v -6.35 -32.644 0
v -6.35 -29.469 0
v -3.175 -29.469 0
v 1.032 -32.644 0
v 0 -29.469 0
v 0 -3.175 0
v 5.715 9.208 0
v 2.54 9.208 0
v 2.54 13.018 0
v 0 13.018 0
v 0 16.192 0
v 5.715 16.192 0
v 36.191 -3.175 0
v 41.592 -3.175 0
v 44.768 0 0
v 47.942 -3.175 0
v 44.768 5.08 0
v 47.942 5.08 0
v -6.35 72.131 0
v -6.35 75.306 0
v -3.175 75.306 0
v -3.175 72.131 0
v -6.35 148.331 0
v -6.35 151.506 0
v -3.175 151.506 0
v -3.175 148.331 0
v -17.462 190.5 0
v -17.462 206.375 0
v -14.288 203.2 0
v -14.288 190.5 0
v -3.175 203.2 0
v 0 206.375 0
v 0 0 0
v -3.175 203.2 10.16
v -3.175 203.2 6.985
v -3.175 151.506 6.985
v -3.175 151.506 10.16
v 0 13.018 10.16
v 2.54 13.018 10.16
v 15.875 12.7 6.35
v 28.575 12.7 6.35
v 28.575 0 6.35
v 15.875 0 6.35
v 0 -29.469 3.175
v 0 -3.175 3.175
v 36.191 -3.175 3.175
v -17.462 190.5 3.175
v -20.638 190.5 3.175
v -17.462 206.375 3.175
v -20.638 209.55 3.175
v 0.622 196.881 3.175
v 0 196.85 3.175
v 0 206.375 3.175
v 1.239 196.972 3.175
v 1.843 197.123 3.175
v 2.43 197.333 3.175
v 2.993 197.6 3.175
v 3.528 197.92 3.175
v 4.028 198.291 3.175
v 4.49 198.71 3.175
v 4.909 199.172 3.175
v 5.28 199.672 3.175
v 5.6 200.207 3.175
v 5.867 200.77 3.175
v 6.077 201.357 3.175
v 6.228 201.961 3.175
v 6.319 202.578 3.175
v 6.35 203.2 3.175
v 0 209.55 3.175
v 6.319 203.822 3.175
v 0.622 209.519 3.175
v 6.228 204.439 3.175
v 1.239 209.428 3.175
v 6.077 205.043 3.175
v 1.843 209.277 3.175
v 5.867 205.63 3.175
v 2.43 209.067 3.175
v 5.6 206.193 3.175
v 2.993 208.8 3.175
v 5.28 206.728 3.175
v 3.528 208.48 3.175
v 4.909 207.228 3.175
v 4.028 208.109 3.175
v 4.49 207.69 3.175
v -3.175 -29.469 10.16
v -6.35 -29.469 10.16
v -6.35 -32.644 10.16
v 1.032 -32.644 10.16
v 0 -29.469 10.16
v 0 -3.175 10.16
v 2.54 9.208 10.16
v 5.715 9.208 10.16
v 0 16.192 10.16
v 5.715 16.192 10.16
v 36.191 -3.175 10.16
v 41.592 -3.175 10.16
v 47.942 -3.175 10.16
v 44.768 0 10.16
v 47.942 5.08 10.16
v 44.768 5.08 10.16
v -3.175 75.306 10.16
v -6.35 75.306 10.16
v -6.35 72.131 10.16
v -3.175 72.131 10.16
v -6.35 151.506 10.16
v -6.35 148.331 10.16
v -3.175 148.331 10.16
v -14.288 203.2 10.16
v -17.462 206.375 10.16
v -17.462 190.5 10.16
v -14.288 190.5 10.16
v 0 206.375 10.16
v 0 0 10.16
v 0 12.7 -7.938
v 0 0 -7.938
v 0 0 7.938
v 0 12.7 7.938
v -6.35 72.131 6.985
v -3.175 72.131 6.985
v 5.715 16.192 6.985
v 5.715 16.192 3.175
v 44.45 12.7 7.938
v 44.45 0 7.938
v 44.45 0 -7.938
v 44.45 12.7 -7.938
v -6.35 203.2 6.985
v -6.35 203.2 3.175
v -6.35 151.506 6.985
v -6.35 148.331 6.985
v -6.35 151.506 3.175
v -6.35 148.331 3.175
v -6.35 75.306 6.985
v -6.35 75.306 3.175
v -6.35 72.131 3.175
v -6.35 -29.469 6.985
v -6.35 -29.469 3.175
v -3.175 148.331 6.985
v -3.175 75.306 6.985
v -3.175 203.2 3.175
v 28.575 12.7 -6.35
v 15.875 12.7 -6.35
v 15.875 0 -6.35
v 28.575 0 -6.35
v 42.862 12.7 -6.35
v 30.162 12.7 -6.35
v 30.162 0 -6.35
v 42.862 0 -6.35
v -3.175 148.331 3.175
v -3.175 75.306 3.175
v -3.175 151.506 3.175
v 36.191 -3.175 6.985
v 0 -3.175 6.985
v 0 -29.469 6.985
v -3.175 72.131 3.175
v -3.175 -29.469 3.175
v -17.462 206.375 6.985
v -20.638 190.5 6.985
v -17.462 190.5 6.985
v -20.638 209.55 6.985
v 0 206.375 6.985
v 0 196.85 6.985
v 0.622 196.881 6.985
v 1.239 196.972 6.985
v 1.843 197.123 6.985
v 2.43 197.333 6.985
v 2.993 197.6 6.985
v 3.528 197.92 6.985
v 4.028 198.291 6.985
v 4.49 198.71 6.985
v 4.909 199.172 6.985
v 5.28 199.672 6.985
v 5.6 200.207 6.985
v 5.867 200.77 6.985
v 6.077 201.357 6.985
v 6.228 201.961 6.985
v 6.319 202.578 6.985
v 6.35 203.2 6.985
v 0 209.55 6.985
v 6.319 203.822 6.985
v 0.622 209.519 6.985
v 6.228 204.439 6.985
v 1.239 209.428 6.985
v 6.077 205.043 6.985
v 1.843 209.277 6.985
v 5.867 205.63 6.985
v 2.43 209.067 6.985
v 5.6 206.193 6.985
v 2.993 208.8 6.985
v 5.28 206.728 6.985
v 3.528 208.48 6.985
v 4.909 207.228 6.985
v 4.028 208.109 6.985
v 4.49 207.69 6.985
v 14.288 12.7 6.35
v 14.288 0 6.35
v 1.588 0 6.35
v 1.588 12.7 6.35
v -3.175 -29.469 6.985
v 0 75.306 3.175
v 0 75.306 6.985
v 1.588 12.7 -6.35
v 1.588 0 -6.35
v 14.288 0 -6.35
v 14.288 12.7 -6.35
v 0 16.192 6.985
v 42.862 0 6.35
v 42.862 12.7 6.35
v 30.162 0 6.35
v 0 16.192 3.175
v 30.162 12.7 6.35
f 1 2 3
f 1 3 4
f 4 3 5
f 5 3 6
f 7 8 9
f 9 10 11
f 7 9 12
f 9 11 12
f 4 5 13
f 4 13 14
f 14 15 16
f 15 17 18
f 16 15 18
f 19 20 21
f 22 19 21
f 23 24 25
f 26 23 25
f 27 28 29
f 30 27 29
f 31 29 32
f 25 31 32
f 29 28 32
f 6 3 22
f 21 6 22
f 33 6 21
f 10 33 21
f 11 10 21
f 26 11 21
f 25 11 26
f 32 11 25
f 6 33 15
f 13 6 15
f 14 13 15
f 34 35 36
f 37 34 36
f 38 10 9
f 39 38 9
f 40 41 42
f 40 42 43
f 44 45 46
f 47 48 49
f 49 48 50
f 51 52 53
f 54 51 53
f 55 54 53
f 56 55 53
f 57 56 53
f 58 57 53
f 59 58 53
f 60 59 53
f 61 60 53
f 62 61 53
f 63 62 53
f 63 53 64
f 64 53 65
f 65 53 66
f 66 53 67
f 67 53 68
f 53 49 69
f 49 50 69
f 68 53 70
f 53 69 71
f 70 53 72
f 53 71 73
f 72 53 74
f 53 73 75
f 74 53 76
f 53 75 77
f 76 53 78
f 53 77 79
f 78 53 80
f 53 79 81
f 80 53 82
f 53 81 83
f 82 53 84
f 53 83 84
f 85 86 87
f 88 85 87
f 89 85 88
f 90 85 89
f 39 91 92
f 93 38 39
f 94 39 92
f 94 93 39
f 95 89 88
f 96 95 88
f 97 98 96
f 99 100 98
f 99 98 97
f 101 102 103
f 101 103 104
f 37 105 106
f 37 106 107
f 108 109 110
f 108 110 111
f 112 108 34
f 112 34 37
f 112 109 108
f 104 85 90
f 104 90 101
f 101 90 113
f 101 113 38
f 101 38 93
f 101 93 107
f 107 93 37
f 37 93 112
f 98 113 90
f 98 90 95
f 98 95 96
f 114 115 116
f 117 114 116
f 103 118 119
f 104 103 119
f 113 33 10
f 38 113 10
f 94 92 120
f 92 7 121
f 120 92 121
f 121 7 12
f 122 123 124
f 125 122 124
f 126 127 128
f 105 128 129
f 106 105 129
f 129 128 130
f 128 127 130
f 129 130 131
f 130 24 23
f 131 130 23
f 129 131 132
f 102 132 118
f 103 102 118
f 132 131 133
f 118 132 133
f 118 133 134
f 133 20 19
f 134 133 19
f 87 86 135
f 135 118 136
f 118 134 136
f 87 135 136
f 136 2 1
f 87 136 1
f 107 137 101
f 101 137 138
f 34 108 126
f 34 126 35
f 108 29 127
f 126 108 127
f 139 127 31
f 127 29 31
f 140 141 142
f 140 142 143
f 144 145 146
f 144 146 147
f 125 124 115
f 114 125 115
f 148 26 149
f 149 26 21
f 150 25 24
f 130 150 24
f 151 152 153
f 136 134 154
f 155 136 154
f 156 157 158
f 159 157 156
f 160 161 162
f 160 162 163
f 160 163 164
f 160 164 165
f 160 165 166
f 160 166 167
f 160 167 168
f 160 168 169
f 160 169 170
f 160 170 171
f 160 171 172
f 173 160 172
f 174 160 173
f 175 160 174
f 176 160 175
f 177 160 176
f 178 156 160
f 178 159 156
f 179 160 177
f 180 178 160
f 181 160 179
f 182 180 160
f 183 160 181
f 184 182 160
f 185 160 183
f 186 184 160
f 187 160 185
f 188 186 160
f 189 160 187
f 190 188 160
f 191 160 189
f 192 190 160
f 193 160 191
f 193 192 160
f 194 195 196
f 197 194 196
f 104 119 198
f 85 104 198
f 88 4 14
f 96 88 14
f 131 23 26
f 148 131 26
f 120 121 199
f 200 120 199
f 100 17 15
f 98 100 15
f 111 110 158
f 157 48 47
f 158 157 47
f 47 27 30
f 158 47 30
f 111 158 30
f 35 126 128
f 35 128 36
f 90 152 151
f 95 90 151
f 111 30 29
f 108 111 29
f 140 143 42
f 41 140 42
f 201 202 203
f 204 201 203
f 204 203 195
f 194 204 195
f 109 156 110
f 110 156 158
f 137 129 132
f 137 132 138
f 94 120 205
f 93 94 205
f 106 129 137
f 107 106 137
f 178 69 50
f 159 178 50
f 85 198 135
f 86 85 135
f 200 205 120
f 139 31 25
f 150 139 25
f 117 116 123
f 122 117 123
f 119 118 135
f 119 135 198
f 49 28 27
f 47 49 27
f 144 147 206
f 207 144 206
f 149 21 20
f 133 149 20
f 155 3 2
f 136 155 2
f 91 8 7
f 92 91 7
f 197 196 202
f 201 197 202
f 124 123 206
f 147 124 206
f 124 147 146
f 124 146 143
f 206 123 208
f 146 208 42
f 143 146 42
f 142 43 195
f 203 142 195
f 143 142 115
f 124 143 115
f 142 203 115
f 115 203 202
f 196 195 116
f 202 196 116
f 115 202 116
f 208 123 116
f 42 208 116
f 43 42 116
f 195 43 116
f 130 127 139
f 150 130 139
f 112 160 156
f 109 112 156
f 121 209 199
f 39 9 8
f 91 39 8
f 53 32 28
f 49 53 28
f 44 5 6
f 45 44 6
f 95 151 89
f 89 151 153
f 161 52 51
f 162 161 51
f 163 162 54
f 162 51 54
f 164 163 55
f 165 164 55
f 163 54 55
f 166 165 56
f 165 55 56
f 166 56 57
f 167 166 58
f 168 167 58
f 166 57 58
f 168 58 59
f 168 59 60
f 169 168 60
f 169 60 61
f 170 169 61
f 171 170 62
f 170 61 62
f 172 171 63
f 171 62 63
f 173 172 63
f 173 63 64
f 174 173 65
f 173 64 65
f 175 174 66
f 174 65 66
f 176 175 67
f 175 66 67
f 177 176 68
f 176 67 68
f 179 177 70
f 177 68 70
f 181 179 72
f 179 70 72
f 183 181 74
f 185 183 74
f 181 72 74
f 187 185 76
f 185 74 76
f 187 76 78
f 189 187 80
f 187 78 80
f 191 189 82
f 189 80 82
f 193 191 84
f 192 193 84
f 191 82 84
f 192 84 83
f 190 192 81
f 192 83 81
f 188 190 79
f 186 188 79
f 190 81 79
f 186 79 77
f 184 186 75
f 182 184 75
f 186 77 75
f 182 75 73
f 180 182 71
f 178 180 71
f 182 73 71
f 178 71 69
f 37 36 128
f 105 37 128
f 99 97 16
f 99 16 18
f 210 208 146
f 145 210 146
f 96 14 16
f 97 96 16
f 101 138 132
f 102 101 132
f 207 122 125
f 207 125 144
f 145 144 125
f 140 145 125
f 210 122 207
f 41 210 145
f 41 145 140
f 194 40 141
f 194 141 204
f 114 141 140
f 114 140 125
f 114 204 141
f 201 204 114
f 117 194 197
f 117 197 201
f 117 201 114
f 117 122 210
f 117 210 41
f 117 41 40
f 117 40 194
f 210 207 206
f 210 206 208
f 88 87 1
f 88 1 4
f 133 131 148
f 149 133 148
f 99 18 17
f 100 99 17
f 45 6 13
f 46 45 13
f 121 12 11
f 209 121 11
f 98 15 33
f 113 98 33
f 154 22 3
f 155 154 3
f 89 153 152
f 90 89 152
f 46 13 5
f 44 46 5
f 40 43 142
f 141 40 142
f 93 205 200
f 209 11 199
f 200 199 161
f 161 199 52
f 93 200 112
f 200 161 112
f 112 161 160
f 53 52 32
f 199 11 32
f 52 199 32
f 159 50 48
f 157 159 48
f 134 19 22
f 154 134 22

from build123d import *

# Parameters (mm, degrees)
F1_DEPTH = 10.16
F2_START = 3.175
F0_W     = 3.175
F0_H     = 51.6942042675
F0_H_2   = 101.6
F0_H_3   = 73.025
F2_DEPTH = 3.81
F4_DEPTH = 12.7


with BuildPart() as f1:
    # F0 (on Top) → F1 (new body)
    with BuildSketch(Plane.XY):
        Polygon((-17.4625, 206.375), (-17.4625, 190.5), (-14.2875, 190.5), (-14.2875, 203.2), (-6.35, 203.2), (-3.175, 203.2), (-3.175, 151.5057957325), (-6.35, 151.5057957325), (-6.35, 148.3307957325), (-3.175, 148.3307957325), (-3.175, 75.3057957325), (-6.35, 75.3057957325), (-6.35, 72.1307957325), (-3.175, 72.1307957325), (-3.175, -29.4692042675), (-6.35, -29.4692042675), (-6.35, -32.6442042675), (1.0316200355, -32.6442042675), (41.5925, -3.175), (47.9425, -3.175), (47.9425, 5.08), (44.7675, 5.08), (44.7675, 0), (0, 0), (0, 13.0175), (2.54, 13.0175), (2.54, 9.2075), (5.715, 9.2075), (5.715, 16.1925), (0, 16.1925), (0, 75.3057957325), (0, 196.85), (0, 206.375), align=None)
        Polygon((0, -29.4692042675), (0, -3.175), (36.190867367, -3.175), align=None, mode=Mode.SUBTRACT)
    extrude(amount=F1_DEPTH)

    # F0 (on Top) → F2 (join)
    with BuildSketch(Plane.XY.offset(F2_START)):
        Polygon((-20.6375, 190.5), (-17.4625, 190.5), (-17.4625, 206.375), (0, 206.375), (0, 209.55), (-20.6375, 209.55), align=None)
        with Locations((-4.7625, 177.3528978662)):
            Rectangle(F0_W, F0_H)
        with Locations((-4.7625, 21.3307957325)):
            Rectangle(F0_W, F0_H_2)
        Polygon((5.715, 16.1925), (0, 75.3057957325), (0, 16.1925), align=None)
        Polygon((36.190867367, -3.175), (0, -3.175), (0, -29.4692042675), align=None)
        with BuildLine():
            Line((0, 209.55), (0, 206.375))
            Line((0, 206.375), (0, 196.85))
            ThreePointArc((0, 196.85), (6.35, 203.2), (0, 209.55))
        make_face()
        with Locations((-4.7625, 111.8182957325)):
            Rectangle(F0_W, F0_H_3)
    extrude(amount=F2_DEPTH)


with BuildPart() as f4:
    # F3 (on face) → F4 (new body)
    with BuildSketch(Plane(origin=(0, 0, 0), x_dir=(-1, 0, 0), z_dir=(0, 1, 0))):
        Polygon((0, -7.9375), (0, 0), (-1.5875, 0), (-1.5875, -6.35), (-14.2875, -6.35), (-14.2875, 0), (-15.875, 0), (-15.875, -6.35), (-28.575, -6.35), (-28.575, 0), (-30.1625, 0), (-30.1625, -6.35), (-42.8625, -6.35), (-42.8625, 0), (-44.45, 0), (-44.45, -7.9375), align=None)
        Polygon((0, 0), (0, 7.9375), (-44.45, 7.9375), (-44.45, 0), (-42.8625, 0), (-42.8625, 6.35), (-30.1625, 6.35), (-30.1625, 0), (-28.575, 0), (-28.575, 6.35), (-15.875, 6.35), (-15.875, 0), (-14.2875, 0), (-14.2875, 6.35), (-1.5875, 6.35), (-1.5875, 0), align=None)
    extrude(amount=F4_DEPTH)


solid = Compound([f1.part, f4.part])
